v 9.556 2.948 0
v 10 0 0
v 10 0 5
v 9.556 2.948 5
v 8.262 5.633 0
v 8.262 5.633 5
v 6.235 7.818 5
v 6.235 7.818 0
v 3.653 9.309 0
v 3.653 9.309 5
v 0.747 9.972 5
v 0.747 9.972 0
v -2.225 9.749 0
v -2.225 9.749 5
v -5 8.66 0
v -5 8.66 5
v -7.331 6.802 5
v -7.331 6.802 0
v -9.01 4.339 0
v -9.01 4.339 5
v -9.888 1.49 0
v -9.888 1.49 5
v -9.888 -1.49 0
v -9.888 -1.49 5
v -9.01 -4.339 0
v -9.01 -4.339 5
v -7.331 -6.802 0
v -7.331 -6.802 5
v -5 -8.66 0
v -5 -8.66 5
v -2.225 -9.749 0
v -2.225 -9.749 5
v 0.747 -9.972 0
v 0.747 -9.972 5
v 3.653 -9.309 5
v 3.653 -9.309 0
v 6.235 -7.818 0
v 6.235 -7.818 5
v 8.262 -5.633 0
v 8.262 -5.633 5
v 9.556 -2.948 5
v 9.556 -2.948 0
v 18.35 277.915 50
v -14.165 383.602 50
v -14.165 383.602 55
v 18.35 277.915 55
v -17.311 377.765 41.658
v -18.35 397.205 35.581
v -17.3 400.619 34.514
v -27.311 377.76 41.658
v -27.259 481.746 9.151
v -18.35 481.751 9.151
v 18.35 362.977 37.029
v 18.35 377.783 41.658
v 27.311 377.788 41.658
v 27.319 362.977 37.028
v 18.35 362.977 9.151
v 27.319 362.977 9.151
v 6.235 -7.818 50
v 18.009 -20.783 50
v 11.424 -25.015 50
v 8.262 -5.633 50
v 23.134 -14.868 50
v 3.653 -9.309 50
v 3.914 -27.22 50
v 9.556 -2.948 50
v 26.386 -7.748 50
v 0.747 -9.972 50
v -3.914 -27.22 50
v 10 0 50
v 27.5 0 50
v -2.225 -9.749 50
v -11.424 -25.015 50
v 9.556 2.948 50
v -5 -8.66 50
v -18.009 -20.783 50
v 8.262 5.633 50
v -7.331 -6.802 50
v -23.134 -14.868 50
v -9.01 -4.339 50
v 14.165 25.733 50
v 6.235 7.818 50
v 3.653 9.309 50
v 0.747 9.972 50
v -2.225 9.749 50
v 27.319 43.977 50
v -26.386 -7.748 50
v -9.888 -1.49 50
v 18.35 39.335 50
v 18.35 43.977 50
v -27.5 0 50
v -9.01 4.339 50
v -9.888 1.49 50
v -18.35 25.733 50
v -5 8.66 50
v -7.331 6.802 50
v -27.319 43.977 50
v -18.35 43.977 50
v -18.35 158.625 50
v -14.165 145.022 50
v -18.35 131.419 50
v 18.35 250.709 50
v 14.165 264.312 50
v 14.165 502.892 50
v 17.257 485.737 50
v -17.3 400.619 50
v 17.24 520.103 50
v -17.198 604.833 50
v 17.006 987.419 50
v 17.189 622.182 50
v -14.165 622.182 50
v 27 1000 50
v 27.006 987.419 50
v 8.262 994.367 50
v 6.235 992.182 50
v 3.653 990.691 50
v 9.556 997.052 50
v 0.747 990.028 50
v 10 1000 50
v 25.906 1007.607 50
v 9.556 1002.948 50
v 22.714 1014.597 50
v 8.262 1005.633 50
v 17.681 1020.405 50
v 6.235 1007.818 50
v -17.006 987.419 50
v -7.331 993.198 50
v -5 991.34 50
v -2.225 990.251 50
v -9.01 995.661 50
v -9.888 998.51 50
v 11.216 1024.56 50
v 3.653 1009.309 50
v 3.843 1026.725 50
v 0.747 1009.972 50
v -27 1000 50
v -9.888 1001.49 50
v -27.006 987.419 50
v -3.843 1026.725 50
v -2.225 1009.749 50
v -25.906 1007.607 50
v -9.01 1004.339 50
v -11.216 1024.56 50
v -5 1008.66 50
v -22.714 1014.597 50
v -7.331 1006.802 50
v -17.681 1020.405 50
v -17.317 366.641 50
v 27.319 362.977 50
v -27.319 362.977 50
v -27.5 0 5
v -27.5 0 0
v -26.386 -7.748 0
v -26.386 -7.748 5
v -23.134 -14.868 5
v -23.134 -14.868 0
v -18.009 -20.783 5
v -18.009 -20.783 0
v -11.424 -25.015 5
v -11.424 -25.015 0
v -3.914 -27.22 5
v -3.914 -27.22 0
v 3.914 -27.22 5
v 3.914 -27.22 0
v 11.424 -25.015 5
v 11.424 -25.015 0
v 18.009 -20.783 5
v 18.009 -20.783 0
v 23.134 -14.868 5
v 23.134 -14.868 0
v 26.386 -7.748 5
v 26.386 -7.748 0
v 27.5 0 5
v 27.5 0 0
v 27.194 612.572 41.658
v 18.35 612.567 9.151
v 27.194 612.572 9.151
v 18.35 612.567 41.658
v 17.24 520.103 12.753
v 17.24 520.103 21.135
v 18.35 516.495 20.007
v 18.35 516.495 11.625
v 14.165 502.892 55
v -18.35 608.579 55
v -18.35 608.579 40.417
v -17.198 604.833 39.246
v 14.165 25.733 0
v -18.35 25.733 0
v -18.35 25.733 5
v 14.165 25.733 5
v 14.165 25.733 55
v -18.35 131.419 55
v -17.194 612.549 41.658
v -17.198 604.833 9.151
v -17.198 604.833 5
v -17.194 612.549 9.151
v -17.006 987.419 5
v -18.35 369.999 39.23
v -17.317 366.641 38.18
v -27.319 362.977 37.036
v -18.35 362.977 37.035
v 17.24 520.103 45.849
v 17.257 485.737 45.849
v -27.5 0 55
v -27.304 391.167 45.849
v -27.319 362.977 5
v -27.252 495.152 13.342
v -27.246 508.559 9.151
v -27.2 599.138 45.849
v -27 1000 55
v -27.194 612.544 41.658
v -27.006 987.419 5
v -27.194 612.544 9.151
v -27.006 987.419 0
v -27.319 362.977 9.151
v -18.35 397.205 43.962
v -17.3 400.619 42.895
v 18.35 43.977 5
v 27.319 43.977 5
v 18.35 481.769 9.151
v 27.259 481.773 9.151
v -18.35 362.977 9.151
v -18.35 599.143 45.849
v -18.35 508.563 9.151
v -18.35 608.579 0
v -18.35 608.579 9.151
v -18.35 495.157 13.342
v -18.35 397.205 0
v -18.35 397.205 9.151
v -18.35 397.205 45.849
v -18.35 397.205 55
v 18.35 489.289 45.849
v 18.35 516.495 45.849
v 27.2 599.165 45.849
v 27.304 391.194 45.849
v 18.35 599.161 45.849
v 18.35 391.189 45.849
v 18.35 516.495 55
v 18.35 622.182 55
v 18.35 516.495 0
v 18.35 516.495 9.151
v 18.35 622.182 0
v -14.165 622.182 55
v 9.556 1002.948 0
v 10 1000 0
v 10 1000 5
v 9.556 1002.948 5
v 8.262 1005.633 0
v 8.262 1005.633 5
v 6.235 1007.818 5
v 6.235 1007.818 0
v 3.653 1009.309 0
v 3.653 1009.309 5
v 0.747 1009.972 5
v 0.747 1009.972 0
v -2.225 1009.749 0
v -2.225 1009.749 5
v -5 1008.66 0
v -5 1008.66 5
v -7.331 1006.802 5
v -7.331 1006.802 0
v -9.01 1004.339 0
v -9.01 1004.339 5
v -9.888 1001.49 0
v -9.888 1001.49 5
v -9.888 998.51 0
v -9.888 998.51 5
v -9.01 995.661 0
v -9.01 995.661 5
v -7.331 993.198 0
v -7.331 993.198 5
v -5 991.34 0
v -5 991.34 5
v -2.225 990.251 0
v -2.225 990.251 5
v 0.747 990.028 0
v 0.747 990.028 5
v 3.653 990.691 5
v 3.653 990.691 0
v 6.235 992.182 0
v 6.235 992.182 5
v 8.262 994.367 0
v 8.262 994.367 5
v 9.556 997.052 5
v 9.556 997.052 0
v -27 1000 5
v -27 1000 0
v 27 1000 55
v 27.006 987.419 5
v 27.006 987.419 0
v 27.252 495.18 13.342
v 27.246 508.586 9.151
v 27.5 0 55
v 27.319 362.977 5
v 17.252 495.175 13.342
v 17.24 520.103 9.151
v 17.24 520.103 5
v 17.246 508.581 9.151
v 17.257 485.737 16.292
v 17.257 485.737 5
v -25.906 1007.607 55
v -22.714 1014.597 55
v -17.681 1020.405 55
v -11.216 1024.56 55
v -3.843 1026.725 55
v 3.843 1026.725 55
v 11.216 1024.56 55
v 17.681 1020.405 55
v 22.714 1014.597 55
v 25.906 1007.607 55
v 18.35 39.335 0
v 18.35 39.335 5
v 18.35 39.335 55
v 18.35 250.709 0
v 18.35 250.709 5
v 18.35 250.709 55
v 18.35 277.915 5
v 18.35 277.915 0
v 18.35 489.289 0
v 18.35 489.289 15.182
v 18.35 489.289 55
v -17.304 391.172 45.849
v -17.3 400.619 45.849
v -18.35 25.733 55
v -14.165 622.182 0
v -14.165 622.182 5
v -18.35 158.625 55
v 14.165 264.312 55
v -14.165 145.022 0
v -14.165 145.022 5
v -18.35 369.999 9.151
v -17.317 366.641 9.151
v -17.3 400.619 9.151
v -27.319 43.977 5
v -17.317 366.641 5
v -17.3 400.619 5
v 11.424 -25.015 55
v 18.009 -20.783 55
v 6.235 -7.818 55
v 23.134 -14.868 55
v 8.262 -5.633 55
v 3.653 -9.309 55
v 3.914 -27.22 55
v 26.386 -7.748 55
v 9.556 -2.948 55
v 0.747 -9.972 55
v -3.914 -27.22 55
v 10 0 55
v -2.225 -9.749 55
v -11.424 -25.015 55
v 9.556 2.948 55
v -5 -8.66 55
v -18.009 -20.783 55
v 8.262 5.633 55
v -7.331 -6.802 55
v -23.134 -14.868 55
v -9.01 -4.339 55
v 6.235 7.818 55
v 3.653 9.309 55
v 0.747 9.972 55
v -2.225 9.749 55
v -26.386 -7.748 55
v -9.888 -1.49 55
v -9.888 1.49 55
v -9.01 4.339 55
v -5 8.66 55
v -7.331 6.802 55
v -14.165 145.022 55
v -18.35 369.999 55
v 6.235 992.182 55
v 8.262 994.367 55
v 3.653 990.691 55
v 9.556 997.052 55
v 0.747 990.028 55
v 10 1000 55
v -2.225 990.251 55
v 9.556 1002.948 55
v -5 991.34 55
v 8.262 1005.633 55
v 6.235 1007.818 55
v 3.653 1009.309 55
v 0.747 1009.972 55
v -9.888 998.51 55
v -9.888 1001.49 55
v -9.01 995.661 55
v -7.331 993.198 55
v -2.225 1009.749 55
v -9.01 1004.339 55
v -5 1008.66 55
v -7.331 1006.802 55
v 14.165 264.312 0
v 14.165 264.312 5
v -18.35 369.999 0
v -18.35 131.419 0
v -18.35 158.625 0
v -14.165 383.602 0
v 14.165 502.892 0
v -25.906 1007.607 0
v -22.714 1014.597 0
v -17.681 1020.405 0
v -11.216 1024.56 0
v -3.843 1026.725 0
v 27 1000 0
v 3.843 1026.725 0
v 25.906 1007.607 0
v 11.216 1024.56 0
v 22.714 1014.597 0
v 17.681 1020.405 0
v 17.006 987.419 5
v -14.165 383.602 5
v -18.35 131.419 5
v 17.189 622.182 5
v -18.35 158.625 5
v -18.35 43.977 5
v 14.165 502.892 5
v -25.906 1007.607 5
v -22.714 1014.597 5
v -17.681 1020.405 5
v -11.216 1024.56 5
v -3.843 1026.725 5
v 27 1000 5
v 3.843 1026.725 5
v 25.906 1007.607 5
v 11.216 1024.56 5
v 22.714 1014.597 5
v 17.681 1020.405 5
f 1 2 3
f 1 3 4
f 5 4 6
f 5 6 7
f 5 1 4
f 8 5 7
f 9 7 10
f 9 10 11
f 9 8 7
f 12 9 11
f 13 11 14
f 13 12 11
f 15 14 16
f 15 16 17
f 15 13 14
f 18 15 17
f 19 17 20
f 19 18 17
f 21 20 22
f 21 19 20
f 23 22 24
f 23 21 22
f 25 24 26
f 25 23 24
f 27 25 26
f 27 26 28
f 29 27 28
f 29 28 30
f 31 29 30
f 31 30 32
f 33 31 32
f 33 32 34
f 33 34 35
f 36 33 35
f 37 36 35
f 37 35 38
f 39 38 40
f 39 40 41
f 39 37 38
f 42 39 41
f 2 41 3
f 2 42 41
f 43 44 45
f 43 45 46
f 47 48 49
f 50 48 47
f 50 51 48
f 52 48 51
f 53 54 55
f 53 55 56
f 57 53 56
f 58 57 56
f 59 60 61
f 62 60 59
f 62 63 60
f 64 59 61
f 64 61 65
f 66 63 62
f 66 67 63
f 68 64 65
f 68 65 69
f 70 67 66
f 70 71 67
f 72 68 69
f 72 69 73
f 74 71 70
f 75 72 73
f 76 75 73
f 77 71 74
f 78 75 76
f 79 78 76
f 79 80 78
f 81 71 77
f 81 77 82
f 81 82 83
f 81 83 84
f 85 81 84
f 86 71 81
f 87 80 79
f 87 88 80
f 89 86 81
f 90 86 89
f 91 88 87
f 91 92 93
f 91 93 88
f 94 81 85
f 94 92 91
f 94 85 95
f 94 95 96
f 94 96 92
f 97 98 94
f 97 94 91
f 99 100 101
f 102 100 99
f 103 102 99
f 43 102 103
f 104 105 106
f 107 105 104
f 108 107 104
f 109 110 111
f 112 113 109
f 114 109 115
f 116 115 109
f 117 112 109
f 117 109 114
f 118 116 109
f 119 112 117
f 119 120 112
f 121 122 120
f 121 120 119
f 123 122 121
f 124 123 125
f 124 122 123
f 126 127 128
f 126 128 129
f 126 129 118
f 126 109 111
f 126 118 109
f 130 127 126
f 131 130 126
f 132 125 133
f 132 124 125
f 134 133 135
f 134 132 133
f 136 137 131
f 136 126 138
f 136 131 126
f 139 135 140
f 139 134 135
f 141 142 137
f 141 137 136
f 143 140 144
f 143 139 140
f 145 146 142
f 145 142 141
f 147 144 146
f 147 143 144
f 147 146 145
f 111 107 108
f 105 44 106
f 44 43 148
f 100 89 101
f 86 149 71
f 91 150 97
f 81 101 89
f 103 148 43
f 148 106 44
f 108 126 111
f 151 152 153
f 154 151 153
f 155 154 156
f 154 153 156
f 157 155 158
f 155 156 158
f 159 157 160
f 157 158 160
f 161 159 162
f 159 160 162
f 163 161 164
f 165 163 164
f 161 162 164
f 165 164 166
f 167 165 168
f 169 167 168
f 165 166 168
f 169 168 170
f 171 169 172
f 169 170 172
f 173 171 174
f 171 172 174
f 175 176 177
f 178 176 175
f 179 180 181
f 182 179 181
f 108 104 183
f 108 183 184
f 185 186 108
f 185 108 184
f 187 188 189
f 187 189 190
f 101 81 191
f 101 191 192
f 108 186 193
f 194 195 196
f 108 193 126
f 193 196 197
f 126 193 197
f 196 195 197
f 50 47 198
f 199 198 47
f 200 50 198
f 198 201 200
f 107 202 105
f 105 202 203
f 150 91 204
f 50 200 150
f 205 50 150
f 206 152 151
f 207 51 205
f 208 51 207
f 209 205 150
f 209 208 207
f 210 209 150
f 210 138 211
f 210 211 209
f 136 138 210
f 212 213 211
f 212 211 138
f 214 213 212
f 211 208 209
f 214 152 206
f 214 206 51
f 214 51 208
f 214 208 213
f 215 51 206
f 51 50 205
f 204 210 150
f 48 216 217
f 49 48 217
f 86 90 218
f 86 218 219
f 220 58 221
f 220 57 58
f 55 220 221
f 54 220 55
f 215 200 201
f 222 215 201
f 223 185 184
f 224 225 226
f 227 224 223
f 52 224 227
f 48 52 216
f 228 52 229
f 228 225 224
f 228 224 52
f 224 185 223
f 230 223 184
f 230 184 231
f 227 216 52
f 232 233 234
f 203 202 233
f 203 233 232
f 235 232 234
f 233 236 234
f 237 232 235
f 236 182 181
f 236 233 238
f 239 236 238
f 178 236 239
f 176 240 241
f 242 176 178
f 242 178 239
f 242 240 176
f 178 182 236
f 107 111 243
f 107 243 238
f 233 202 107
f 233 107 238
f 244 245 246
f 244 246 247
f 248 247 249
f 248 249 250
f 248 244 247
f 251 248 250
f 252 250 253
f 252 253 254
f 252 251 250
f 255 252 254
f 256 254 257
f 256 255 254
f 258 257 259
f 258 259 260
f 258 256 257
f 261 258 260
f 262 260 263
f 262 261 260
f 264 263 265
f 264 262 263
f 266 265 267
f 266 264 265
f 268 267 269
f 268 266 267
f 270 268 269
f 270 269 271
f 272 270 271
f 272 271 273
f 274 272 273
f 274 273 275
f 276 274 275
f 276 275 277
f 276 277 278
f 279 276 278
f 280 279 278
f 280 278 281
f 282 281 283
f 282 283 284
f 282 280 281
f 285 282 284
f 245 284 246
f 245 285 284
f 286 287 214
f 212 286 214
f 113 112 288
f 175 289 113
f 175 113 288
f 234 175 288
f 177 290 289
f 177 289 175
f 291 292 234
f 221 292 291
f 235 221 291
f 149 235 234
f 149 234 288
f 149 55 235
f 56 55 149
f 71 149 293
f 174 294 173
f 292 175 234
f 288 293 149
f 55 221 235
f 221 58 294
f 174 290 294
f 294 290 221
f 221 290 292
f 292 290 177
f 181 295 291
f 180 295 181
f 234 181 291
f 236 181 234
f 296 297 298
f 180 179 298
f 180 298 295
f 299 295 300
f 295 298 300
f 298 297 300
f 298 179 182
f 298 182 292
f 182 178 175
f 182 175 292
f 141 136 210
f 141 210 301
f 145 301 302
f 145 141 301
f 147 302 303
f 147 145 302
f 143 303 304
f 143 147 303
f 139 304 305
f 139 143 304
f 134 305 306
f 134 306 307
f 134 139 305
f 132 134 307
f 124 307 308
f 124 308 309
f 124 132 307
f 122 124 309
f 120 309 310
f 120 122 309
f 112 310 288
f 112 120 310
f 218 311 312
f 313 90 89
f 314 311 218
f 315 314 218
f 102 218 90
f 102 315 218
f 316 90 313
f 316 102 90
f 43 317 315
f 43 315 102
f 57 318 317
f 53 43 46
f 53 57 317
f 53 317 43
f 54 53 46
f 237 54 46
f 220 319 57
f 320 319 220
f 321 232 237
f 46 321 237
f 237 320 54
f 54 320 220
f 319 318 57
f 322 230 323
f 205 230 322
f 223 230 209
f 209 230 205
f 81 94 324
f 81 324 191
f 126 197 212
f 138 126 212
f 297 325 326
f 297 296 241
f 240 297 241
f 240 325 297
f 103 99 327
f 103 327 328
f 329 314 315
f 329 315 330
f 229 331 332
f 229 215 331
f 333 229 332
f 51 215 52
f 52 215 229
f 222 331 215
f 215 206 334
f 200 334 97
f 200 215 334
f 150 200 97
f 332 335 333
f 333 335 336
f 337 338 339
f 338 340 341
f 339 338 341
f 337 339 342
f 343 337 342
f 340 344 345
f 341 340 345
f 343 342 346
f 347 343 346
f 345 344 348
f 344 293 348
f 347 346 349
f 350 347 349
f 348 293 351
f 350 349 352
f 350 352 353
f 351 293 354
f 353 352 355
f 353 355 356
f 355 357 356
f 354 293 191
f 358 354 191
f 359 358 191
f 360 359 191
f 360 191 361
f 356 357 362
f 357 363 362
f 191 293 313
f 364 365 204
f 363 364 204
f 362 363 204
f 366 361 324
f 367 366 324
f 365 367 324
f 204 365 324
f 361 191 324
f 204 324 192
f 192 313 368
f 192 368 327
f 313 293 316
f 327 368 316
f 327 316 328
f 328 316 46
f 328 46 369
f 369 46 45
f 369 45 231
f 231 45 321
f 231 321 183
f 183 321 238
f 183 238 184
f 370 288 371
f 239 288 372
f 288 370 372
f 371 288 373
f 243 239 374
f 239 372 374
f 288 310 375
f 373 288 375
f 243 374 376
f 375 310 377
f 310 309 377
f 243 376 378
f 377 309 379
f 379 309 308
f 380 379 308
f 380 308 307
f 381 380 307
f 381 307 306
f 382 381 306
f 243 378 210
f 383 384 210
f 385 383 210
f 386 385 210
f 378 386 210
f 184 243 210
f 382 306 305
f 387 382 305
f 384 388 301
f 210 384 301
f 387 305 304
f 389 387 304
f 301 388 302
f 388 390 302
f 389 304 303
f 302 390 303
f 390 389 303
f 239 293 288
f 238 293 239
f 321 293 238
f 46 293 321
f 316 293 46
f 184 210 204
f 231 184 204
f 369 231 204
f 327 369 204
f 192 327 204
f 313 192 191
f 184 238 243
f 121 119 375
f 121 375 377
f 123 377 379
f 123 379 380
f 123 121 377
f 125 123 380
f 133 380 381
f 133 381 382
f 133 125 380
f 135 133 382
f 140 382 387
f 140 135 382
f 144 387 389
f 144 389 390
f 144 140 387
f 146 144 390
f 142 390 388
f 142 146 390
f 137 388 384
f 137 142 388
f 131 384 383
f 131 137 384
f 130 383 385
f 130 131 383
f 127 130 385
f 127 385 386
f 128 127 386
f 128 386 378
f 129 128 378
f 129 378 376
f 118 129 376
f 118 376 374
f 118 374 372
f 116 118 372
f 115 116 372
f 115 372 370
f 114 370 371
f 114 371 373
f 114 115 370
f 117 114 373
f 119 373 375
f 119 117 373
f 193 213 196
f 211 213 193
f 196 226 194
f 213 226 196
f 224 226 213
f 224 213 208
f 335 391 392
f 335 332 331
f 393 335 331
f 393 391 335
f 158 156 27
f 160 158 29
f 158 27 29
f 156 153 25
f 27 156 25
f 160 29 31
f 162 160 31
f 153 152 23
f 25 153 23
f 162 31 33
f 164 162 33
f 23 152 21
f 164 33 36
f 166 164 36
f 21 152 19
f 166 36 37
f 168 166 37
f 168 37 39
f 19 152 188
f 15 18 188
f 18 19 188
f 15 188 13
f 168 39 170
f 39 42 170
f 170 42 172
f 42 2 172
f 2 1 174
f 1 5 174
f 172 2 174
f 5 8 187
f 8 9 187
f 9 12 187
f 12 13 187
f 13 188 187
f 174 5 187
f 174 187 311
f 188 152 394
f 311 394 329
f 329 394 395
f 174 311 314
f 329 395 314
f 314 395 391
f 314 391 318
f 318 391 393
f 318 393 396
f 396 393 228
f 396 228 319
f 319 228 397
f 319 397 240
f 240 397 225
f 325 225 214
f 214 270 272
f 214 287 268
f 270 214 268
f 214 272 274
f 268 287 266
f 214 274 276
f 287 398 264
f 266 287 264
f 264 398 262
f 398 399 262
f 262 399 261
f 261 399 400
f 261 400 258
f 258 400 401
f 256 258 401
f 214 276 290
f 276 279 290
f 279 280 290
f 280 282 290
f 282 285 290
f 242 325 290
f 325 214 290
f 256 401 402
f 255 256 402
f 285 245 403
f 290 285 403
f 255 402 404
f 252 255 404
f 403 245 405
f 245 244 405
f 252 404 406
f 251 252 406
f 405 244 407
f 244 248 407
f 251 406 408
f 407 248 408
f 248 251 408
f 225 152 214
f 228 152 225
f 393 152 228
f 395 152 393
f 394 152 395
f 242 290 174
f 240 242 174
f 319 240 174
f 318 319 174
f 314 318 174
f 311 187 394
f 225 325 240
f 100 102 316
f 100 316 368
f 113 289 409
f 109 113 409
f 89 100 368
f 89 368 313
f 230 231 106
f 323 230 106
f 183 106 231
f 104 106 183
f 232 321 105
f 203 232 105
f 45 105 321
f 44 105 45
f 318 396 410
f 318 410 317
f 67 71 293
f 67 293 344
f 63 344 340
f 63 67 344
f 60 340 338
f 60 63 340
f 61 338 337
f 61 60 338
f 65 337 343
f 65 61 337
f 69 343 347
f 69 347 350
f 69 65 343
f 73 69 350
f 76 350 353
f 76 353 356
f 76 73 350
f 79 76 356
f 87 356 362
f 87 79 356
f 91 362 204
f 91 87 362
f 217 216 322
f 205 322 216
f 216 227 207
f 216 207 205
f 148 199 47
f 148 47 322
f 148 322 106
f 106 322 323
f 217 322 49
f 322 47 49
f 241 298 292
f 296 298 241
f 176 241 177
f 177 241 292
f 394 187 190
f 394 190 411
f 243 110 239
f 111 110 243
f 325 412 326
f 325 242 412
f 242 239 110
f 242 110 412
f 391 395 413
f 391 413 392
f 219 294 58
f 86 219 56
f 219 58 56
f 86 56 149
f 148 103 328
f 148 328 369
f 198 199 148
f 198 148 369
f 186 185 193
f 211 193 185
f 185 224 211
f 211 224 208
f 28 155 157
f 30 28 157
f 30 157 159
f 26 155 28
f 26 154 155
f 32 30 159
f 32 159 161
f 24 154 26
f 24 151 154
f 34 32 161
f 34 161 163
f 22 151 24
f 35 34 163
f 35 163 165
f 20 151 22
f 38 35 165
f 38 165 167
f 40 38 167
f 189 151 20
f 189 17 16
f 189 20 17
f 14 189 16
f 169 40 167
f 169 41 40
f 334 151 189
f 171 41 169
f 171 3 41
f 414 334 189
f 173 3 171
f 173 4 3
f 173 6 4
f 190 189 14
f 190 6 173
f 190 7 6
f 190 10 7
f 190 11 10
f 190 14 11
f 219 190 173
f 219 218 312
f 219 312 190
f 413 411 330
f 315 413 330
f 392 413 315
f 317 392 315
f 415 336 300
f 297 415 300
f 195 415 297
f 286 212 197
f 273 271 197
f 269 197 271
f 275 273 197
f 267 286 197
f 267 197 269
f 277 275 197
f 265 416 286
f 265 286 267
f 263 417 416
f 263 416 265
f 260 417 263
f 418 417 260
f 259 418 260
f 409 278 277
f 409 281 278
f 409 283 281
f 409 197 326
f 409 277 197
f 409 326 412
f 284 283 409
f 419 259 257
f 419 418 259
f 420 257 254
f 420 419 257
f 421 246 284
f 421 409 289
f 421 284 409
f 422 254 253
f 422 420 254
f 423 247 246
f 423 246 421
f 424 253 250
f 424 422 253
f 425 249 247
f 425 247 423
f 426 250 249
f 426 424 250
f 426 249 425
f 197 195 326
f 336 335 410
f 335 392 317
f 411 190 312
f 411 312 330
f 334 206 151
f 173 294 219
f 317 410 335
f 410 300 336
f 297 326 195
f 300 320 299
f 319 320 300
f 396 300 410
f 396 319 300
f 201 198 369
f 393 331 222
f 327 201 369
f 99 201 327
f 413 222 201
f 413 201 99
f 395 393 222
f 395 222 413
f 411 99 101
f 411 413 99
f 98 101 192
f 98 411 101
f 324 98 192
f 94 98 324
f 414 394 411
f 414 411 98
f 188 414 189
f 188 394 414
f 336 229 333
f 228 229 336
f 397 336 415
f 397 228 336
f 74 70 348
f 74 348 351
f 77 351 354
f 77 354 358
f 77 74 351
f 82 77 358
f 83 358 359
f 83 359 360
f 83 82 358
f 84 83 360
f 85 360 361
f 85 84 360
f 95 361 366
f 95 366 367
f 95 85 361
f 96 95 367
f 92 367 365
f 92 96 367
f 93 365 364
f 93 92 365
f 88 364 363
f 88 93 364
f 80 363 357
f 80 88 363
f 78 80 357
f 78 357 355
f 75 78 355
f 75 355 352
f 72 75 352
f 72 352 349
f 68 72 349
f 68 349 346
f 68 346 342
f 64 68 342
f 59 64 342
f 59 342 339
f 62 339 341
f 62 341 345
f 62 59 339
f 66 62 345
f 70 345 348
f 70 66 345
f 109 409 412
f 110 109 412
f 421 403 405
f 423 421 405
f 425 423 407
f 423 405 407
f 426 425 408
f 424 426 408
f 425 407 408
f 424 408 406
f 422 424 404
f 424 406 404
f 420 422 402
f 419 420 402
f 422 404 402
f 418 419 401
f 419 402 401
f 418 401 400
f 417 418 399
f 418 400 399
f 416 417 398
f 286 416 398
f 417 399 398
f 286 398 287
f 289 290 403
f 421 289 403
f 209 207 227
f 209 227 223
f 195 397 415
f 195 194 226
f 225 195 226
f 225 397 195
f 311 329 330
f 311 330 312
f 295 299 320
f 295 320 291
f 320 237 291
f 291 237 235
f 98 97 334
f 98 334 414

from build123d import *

# Parameters (mm, degrees)
SKETCH1_R               = 10
BOSS_EXTRUDE2_DEPTH     = 5
BOSS_EXTRUDE3_DEPTH     = 55
BOSS_EXTRUDE4_START     = 50
SKETCH1_4_R             = 10
BOSS_EXTRUDE4_DEPTH     = 5
CUT_EXTRUDE2_DEPTH      = 1030.927549364
CUT_EXTRUDE2_DEPTH_BACK = 1030.927549364
CUT_EXTRUDE4_DEPTH      = 1029.839273162
CUT_EXTRUDE4_DEPTH_BACK = 1029.839273162
SKETCH5_W               = 8.968511721
SKETCH5_H               = 45
BOSS_EXTRUDE5_DEPTH     = 319


with BuildPart() as part:
    # Sketch1 → Boss-Extrude2 (new body)
    with BuildSketch(Plane.XY):
        with BuildLine():
            Line((27.006290467, 987.419065417), (27, 1000))
            ThreePointArc((27, 1000), (11.625043938, 1024.369209126), (-16.989507662, 1020.984676061))
            ThreePointArc((-16.989507662, 1020.984676061), (-24.369209126, 1011.625043938), (-27, 1000))
            Line((-27, 1000), (-27.006290467, 987.419065417))
            Line((-27.006290467, 987.419065417), (-17.006290467, 987.419065417))
            Line((-17.006290467, 987.419065417), (-17.318511721, 362.976557611))
            Line((-17.318511721, 362.976557611), (-27.318511721, 362.976557611))
            Line((-27.318511721, 362.976557611), (-27.5, 0))
            ThreePointArc((-27.5, 0), (0, -27.5), (27.5, 0))
            Line((27.5, 0), (27.318511721, 362.976557611))
            Line((27.318511721, 362.976557611), (17.318511721, 362.976557611))
            Line((17.318511721, 362.976557611), (17.006290467, 987.419065417))
            Line((17.006290467, 987.419065417), (27.006290467, 987.419065417))
        make_face()
        Circle(SKETCH1_R, mode=Mode.SUBTRACT)
        with Locations((0, 1000)):
            Circle(SKETCH1_R, mode=Mode.SUBTRACT)
    extrude(amount=BOSS_EXTRUDE2_DEPTH)

    # Sketch1<3> → Boss-Extrude3 (add)
    with BuildSketch(Plane.XY):
        Polygon((27.318511721, 362.976557611), (27.006290467, 987.419065417), (17.006290467, 987.419065417), (17.318511721, 362.976557611), align=None)
        Polygon((-17.006290467, 987.419065417), (-27.006290467, 987.419065417), (-27.318511721, 362.976557611), (-17.318511721, 362.976557611), align=None)
    extrude(amount=BOSS_EXTRUDE3_DEPTH)

    # Sketch1<4> → Boss-Extrude4 (add)
    with BuildSketch(Plane.XY.offset(BOSS_EXTRUDE4_START)):
        with BuildLine():
            Line((27, 1000), (27.5, 0))
            ThreePointArc((27.5, 0), (0, -27.5), (-27.5, 0))
            Line((-27.5, 0), (-27, 1000))
            ThreePointArc((-27, 1000), (0, 1027), (27, 1000))
        make_face()
        Circle(SKETCH1_4_R, mode=Mode.SUBTRACT)
        with Locations((0, 1000)):
            Circle(SKETCH1_4_R, mode=Mode.SUBTRACT)
    extrude(amount=BOSS_EXTRUDE4_DEPTH)

    # Sketch3 → Cut-Extrude2 (cut, two sides: drawn at the far end of the back side and taken through both)
    with BuildSketch(Plane(origin=(27.499993125, 0.013749997, 0), x_dir=(0, 0, -1), z_dir=(0.9999998750000234, 0.0004999999375000122, 0)).offset(-CUT_EXTRUDE2_DEPTH_BACK)):
        Polygon((-9.15125207, 508.572247167), (-9.15125207, 612.557963539), (-41.657857257, 612.557963539), align=None)
        Polygon((-9.15125207, 273.788247167), (-9.15125207, 481.759679911), (-41.657857257, 377.773963539), align=None)
        Polygon((-13.342142743, 495.165963539), (-45.84874793, 599.151679911), (-45.84874793, 391.180247167), align=None)
    extrude(amount=CUT_EXTRUDE2_DEPTH + CUT_EXTRUDE2_DEPTH_BACK, mode=Mode.SUBTRACT)

    # Sketch4 → Cut-Extrude4 (cut, two sides: drawn at the far end of the back side and taken through both)
    with BuildSketch(Plane.XY.offset(55).offset(-CUT_EXTRUDE4_DEPTH_BACK)):
        Polygon((14.164977662, 264.312281668), (-18.35, 369.999248569), (-18.35, 158.625314767), align=None)
        Polygon((18.35, 277.915314767), (18.35, 383.602281668), (-14.164977662, 383.602281668), align=None)
        Polygon((18.35, 39.335314767), (18.35, 250.709248569), (-14.164977662, 145.022281668), align=None)
        Polygon((14.164977662, 502.892281668), (-18.35, 608.579248569), (-18.35, 397.205314767), align=None)
        Polygon((18.35, 383.602281668), (18.35, 489.289248569), (-14.164977662, 383.602281668), align=None)
        Polygon((18.35, 516.495314767), (18.35, 622.182281668), (-14.164977662, 622.182281668), align=None)
        Polygon((14.164712586, 25.733143274), (-18.35, 131.419248569), (-18.35, 25.733143274), align=None)
    extrude(amount=CUT_EXTRUDE4_DEPTH + CUT_EXTRUDE4_DEPTH_BACK, mode=Mode.SUBTRACT)

    # Sketch5 → Boss-Extrude5 (add)
    with BuildSketch(Plane.XZ.offset(-362.976557611)):
        with Locations((-22.834255861, 27.5)):
            Rectangle(SKETCH5_W, SKETCH5_H)
        with Locations((22.834255861, 27.5)):
            Rectangle(SKETCH5_W, SKETCH5_H)
    extrude(amount=BOSS_EXTRUDE5_DEPTH)


solid = part.part
